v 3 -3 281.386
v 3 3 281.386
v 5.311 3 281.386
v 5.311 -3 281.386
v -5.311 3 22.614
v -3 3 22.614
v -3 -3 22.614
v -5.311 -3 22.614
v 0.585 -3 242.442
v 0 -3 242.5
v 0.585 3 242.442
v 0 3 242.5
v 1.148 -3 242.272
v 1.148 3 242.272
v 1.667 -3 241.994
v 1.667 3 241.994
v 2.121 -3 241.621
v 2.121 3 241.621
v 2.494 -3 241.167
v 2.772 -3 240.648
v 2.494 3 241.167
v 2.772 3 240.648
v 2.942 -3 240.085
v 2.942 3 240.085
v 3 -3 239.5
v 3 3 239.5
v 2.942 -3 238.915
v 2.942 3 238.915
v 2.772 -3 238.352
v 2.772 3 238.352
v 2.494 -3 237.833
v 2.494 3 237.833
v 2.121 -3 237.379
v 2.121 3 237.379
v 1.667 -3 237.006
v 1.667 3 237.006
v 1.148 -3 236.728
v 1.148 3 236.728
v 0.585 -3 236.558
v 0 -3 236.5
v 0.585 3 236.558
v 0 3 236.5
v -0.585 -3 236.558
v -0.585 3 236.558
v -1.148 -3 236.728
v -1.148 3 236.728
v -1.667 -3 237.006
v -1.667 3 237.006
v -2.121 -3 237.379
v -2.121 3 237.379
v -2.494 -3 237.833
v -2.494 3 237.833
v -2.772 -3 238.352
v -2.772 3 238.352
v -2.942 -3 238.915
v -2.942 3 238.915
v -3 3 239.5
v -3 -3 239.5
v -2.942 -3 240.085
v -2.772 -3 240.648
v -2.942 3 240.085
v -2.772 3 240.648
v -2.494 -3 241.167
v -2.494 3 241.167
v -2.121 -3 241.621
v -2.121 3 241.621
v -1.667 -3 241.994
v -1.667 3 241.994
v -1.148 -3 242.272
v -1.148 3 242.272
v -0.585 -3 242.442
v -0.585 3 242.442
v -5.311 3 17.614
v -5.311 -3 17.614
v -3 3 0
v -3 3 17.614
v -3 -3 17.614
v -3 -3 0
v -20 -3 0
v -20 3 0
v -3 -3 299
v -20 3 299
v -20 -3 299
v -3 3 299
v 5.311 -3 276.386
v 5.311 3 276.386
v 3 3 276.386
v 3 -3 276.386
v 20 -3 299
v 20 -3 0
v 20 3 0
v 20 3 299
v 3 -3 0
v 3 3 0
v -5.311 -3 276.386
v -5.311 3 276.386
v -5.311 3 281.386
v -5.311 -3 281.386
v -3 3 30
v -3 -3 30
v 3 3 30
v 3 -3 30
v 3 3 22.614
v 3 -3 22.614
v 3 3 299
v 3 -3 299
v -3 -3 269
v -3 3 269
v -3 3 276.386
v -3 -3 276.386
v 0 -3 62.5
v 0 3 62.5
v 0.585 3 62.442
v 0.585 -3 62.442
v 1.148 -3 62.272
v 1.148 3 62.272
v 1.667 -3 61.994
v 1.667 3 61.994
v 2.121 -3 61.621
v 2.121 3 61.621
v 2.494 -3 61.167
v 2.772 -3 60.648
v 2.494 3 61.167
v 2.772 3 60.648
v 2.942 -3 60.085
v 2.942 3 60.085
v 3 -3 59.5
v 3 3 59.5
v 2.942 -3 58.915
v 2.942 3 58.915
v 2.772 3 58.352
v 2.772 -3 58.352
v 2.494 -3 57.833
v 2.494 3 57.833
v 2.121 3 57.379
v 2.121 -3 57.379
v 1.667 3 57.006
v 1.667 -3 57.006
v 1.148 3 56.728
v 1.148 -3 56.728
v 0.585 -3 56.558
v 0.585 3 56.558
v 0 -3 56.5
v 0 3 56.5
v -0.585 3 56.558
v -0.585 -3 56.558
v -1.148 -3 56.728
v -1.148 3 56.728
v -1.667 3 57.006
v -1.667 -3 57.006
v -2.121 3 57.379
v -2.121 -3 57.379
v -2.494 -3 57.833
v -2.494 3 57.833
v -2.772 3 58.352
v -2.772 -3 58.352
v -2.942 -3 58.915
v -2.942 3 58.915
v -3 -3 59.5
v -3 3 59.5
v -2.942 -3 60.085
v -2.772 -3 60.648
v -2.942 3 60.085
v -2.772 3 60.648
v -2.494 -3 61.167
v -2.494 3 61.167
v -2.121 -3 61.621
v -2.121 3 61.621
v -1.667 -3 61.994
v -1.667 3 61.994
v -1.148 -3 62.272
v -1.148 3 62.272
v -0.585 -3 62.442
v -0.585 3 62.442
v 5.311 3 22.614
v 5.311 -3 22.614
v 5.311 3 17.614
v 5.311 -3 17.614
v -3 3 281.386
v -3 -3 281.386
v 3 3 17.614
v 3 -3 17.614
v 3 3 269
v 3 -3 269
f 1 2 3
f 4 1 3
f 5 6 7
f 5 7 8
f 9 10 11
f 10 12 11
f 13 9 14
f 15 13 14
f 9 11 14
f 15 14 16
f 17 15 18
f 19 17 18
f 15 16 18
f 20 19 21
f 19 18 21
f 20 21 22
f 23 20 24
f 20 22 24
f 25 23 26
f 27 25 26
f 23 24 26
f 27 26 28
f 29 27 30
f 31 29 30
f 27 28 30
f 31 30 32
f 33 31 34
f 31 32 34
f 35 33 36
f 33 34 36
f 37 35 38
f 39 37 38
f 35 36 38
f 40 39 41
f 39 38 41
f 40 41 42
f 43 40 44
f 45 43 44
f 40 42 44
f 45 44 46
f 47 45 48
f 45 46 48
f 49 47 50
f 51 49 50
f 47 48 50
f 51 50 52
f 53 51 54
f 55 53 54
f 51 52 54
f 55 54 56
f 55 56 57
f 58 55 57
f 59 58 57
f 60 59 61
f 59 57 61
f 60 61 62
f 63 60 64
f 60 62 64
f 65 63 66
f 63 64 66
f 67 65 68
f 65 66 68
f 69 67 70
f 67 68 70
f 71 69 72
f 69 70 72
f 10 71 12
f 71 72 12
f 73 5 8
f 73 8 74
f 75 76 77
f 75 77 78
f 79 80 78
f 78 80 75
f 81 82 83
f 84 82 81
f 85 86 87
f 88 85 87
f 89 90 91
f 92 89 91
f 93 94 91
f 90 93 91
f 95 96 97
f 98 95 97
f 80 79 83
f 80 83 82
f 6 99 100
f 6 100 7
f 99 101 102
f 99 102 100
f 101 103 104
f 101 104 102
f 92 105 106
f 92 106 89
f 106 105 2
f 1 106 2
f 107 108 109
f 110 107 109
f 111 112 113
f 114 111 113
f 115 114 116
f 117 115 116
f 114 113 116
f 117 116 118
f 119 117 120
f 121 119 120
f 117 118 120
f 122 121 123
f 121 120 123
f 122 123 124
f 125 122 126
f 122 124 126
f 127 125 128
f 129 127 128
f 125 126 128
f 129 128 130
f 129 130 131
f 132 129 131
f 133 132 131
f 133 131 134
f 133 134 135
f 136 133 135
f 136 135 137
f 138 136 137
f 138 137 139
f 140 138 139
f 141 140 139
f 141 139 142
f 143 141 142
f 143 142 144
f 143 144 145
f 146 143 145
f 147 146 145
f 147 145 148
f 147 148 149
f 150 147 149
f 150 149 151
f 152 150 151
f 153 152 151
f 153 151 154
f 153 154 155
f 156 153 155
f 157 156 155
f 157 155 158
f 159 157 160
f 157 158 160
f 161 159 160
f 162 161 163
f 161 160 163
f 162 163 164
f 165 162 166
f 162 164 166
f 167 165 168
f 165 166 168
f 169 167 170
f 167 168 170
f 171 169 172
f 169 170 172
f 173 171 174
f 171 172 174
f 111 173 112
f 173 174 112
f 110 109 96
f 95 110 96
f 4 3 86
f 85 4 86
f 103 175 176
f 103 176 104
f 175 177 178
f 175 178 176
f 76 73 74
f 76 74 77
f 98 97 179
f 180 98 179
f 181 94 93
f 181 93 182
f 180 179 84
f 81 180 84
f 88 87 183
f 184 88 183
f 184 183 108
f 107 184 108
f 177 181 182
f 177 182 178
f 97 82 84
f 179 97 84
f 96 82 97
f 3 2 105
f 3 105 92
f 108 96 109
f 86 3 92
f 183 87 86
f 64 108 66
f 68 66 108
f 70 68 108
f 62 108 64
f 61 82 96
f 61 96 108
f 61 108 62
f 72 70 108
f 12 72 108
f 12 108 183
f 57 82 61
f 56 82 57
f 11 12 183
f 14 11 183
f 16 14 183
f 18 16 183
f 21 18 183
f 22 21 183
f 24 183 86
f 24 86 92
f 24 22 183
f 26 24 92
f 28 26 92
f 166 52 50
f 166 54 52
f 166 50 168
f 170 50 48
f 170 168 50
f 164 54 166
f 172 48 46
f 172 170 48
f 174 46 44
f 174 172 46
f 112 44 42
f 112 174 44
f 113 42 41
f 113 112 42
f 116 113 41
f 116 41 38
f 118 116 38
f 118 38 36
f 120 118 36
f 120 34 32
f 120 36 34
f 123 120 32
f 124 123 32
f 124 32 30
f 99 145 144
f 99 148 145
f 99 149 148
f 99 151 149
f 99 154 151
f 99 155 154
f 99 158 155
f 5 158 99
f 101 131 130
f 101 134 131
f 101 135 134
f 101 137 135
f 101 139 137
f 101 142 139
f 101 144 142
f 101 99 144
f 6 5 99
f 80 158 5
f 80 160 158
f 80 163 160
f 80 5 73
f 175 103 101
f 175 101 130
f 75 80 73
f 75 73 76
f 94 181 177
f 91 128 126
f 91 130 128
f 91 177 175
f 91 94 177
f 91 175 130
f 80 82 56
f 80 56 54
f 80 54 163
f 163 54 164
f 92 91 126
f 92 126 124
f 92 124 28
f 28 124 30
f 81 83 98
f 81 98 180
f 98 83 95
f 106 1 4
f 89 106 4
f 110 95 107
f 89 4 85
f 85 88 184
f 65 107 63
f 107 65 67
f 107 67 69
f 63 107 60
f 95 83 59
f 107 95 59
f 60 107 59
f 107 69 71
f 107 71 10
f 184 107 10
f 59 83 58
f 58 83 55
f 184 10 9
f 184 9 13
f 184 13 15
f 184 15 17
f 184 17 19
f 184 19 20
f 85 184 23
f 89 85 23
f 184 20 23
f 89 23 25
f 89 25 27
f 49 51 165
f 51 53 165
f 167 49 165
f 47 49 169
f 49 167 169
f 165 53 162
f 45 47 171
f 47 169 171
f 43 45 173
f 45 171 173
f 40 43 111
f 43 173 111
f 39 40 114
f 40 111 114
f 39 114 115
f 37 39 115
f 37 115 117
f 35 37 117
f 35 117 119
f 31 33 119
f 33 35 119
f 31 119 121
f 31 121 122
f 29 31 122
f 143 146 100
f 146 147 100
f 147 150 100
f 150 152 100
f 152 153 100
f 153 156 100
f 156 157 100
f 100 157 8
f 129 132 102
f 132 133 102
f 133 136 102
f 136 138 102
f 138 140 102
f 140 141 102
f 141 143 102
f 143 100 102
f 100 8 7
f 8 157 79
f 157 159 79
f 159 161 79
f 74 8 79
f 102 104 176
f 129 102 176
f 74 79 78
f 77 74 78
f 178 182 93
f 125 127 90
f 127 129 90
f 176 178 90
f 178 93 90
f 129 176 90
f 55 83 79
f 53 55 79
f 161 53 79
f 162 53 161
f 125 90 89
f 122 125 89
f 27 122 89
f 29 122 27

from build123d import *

# Parameters (mm, degrees)
SKETCH2_W           = 40
SKETCH2_H           = 6
BOSS_EXTRUDE2_DEPTH = 299
SKETCH4_R           = 3
CUT_EXTRUDE2_DEPTH  = 42
CUT_EXTRUDE4_DEPTH  = 42


with BuildPart() as part:
    # Sketch2 → Boss-Extrude2 (new body)
    with BuildSketch(Plane.XY):
        Rectangle(SKETCH2_W, SKETCH2_H)
    extrude(amount=BOSS_EXTRUDE2_DEPTH)

    # Sketch4 → Cut-Extrude2 (cut, symmetric)
    with BuildSketch(Plane(origin=(0, 3, 0), x_dir=(1, 0, 0), z_dir=(0, 1, 0))):
        with Locations(Location((0, -59.5, 0), (0, 0, 270))):
            Circle(SKETCH4_R)
        with Locations(Location((0, -239.5, 0), (0, 0, 270))):
            Circle(SKETCH4_R)
    extrude(amount=CUT_EXTRUDE2_DEPTH, both=True, mode=Mode.SUBTRACT)

    # Sketch5 → Cut-Extrude4 (cut, symmetric)
    with BuildSketch(Plane(origin=(0, 3, 0), x_dir=(1, 0, 0), z_dir=(0, 1, 0))):
        Polygon((-3, -299), (3, -299), (3, -281.386427855), (5.311461506, -281.386427855), (5.311461506, -276.386427855), (3, -276.386427855), (3, -269), (-3, -269), (-3, -276.386427855), (-5.311461506, -276.386427855), (-5.311461506, -281.386427855), (-3, -281.386427855), align=None)
    cut_extrude4 = extrude(amount=CUT_EXTRUDE4_DEPTH, both=True, mode=Mode.SUBTRACT)

    # Mirror2: Cut-Extrude4 across plane
    add(cut_extrude4.mirror(Plane.XY.offset(149.5)), mode=Mode.SUBTRACT)


solid = part.part
